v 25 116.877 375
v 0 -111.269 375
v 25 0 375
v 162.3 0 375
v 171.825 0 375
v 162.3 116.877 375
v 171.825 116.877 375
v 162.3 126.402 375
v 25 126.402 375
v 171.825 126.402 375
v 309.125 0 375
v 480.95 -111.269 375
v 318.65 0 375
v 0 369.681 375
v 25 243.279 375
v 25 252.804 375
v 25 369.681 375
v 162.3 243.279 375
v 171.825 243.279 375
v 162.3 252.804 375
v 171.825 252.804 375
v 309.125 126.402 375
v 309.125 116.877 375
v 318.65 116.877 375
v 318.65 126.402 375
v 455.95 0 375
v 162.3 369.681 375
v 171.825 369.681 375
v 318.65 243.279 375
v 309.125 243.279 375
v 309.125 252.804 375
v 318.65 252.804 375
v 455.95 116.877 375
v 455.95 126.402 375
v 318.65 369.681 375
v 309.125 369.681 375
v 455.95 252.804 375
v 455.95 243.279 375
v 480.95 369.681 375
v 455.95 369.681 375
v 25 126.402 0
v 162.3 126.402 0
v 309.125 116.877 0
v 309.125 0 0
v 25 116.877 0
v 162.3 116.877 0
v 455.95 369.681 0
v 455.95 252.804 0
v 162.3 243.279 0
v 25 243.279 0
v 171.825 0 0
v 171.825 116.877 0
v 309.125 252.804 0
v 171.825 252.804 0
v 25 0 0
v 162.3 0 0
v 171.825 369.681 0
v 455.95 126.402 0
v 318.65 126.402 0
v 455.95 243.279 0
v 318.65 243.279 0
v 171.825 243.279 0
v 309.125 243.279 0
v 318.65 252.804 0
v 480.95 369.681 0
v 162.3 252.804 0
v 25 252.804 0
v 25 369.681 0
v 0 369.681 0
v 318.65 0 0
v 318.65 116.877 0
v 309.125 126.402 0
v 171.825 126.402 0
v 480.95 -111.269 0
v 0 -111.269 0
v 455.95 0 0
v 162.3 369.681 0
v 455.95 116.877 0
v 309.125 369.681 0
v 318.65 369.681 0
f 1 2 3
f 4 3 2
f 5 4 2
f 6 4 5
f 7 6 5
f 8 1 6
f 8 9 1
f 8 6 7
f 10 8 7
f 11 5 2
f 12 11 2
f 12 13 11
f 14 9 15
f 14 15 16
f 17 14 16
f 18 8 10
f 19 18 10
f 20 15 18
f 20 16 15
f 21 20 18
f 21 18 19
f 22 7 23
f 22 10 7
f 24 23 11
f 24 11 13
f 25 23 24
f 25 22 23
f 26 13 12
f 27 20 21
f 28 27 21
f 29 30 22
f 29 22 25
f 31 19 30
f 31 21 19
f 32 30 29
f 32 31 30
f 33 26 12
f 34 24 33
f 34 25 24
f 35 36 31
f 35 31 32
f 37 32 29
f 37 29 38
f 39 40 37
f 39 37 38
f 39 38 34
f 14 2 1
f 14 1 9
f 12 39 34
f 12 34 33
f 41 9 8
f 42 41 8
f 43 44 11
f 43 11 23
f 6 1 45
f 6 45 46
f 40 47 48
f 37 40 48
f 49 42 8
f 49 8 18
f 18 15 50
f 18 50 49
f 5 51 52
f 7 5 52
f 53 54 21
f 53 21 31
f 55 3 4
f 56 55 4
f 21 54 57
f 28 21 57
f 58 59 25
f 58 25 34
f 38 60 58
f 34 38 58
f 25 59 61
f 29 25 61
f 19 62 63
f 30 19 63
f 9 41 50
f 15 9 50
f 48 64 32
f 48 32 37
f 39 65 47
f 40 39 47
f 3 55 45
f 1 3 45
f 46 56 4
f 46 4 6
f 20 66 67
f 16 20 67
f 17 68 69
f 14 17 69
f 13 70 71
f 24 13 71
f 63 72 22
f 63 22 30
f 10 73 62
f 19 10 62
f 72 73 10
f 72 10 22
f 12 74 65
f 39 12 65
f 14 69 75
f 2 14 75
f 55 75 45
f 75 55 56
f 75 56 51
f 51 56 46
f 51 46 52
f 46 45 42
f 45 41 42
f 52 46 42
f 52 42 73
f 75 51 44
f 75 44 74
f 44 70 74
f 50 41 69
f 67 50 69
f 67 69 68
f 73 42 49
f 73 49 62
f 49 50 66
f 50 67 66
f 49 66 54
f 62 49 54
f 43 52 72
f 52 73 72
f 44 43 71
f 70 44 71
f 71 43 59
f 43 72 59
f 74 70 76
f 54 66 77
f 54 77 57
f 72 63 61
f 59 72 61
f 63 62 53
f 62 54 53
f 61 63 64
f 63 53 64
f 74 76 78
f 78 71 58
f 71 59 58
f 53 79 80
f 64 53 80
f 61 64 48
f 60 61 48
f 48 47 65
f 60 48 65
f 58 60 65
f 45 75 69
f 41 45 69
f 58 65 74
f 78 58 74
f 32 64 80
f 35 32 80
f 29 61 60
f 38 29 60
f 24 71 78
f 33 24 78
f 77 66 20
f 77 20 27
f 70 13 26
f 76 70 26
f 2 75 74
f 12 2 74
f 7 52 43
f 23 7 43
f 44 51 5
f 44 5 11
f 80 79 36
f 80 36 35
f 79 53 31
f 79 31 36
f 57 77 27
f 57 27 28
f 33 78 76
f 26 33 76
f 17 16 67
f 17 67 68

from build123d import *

# Parameters (mm, degrees)
SKETCH1_W           = 137.3
SKETCH1_H           = 9.525
SKETCH1_W_2         = 9.525
SKETCH1_H_2         = 116.877063157
SKETCH1_H_3         = 116.877063158
SKETCH1_W_3         = 480.95
SKETCH1_H_4         = 111.268810527
BOSS_EXTRUDE1_DEPTH = 375


with BuildPart() as part:
    # Sketch1 → Boss-Extrude1 (new body)
    with BuildSketch(Plane.XY):
        Polygon((0, 369.681189473), (0, 0), (25, 0), (25, 116.877063158), (25, 126.402063158), (25, 243.279126316), (25, 252.804126316), (25, 369.681189473), align=None)
        with Locations((93.65, 248.041626316)):
            Rectangle(SKETCH1_W, SKETCH1_H)
        with Locations((167.0625, 248.041626316)):
            Rectangle(SKETCH1_W_2, SKETCH1_H)
        with Locations((167.0625, 311.242657894)):
            Rectangle(SKETCH1_W_2, SKETCH1_H_2)
        with Locations((167.0625, 184.840594737)):
            Rectangle(SKETCH1_W_2, SKETCH1_H_3)
        with Locations((93.65, 121.639563158)):
            Rectangle(SKETCH1_W, SKETCH1_H)
        with Locations((167.0625, 121.639563158)):
            Rectangle(SKETCH1_W_2, SKETCH1_H)
        with Locations((167.0625, 58.438531579)):
            Rectangle(SKETCH1_W_2, SKETCH1_H_3)
        with Locations((240.475, 121.639563158)):
            Rectangle(SKETCH1_W, SKETCH1_H)
        with Locations((240.475, 248.041626316)):
            Rectangle(SKETCH1_W, SKETCH1_H)
        with Locations((313.8875, 311.242657894)):
            Rectangle(SKETCH1_W_2, SKETCH1_H_2)
        with Locations((313.8875, 248.041626316)):
            Rectangle(SKETCH1_W_2, SKETCH1_H)
        with Locations((313.8875, 184.840594737)):
            Rectangle(SKETCH1_W_2, SKETCH1_H_3)
        with Locations((387.3, 248.041626316)):
            Rectangle(SKETCH1_W, SKETCH1_H)
        Polygon((455.95, 0), (480.95, 0), (480.95, 369.681189473), (455.95, 369.681189473), (455.95, 252.804126316), (455.95, 243.279126316), (455.95, 126.402063158), (455.95, 116.877063158), align=None)
        with Locations((387.3, 121.639563158)):
            Rectangle(SKETCH1_W, SKETCH1_H)
        with Locations((313.8875, 121.639563158)):
            Rectangle(SKETCH1_W_2, SKETCH1_H)
        with Locations((313.8875, 58.438531579)):
            Rectangle(SKETCH1_W_2, SKETCH1_H_3)
        with Locations((240.475, -55.634405264)):
            Rectangle(SKETCH1_W_3, SKETCH1_H_4)
    extrude(amount=BOSS_EXTRUDE1_DEPTH)


solid = part.part
